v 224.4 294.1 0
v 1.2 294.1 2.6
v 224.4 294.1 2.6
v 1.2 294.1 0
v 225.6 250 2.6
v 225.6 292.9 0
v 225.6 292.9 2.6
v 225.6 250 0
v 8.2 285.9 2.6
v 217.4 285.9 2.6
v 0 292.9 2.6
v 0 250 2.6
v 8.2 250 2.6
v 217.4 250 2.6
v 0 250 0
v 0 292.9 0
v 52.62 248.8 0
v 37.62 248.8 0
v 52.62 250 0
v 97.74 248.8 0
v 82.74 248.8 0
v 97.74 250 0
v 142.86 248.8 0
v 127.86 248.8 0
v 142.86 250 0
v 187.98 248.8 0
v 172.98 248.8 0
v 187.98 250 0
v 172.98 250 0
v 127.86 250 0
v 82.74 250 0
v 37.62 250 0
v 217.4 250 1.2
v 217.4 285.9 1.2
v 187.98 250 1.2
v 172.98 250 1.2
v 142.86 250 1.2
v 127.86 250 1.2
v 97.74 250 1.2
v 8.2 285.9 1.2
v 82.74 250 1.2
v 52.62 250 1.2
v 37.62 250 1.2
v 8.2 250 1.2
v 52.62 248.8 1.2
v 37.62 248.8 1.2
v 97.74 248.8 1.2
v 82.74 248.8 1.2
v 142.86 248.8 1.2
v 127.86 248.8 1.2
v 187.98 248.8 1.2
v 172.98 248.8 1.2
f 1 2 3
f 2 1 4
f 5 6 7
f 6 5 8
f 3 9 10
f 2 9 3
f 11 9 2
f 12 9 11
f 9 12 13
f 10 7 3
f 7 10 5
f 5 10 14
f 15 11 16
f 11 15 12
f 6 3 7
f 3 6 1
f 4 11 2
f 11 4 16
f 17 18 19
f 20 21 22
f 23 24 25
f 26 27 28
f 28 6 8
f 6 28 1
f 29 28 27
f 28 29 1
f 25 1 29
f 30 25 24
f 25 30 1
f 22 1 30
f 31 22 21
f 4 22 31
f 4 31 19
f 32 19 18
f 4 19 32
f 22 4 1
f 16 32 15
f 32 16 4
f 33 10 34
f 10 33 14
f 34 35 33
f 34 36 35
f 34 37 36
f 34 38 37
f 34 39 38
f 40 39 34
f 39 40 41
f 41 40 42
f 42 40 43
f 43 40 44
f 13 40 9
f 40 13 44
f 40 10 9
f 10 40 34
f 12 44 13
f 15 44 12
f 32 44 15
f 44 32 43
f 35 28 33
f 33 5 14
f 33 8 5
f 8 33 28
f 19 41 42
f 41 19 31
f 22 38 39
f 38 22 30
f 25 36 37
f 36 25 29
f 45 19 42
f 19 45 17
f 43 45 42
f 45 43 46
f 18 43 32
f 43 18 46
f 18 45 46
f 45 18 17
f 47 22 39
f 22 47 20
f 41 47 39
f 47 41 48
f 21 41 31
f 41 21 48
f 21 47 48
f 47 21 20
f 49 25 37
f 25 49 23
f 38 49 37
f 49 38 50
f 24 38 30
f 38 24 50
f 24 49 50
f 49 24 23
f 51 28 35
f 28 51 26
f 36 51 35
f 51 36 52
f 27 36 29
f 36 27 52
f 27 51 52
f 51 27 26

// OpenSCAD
// file: common.scad
// ============================================================
// Photo Frame for 13.3" Spectra 6 E-Ink Display
// Shared parameters and utility modules
// ============================================================

/* [Display Parameters] */
// Active (visible) area
active_w = 202.8;
active_h = 270.4;
// Glass outline dimensions
glass_w = 208.8;
glass_h = 284.7;
display_d = 0.85;
// Non-active border (asymmetric)
border_left   = 3.0;
border_right  = 3.0;
border_top    = 3.0;
border_bottom = 11.3;   // 284.7 - 270.4 - 3 = 11.3, FPC side, large non-active area

/* [Driver Board Parameters] */
board_w = 80;
board_h = 40;
board_d = 1.6;
board_clearance = 10;     // component height clearance

/* [Battery Parameters] */
battery_w = 60;
battery_h = 35;
battery_d = 8;

/* [Frame Parameters] */
bezel_w    = 10;          // bezel width around active area
wall_thick = 2.4;         // front frame thickness
back_thick = 1.2;         // back panel thickness (6 layers @ 0.2mm)
frame_d    = 2.6;         // total frame depth (1.2mm back + 1.4mm cavity)
tol        = 0.2;
corner_r   = 3;

/* [Channel Parameters] */
outer_wall  = 2.0;        // outer wall thickness on bezel
inner_lip_d = 0.3;        // inner lip depth (presses on display)
channel_tol = 0.2;        // clearance for back panel in channel
lip_overlap = 2.0;        // how much bezel overlaps the glass on each side

/* [Printer Limits] */
bed_max = 260;

/* [Stand Parameters] */
stand_angle = 12;         // tilt angle in degrees
stand_foot_depth = 100;   // how far the base extends back

/* [FPC Cable] */
// 60-pin FPC exits from bottom of display, offset 2mm to the right
fpc_w = 134;              // FPC ribbon width
fpc_slot_w = fpc_w + 8;   // slot width with clearance (+4mm wider)
fpc_offset_x = 2;         // shifted 2mm to the right from center
fpc_slot_h = 6;

/* [Buttons - 1 reset + 3 custom] */
button_dia     = 3.5;
button_spacing = 12;
button_count   = 4;

/* [Joint Parameters] */
tongue_depth  = 1.2;      // tongue-and-groove interlock depth
tongue_length = 15;        // each tongue segment length
tongue_count  = 4;         // number of tongue segments along width
screw_r       = 1.5;       // M3 screw radius

// ============================================================
// Derived dimensions
// ============================================================

cavity_w = glass_w + 2 * tol;
cavity_h = glass_h + 2 * tol;

frame_w = cavity_w + 2 * bezel_w;
frame_h = cavity_h + 2 * bezel_w;

// Back panel rim widths (design parameters)
panel_rim  = 8.2;    // rim on left, right, top
bottom_rim = 0.8;    // thin bottom rim (hidden in base)

// Derived panel dimensions
panel_w = cavity_w + 2 * panel_rim;
panel_h = cavity_h + panel_rim + bottom_rim;
panel_inset = (frame_w - panel_w) / 2;  // how far panel is inset from bezel edge

// Inner lip width: derived to fill gap between panel rim and window
// Layout: outer_wall + channel_tol + panel_rim + channel_tol + inner_lip_w = win_x
inner_lip_w = bezel_w + tol + lip_overlap - outer_wall - panel_rim - 2 * channel_tol;

// Back panel split: bottom piece as tall as fits the bed
back_split_y = bed_max - 10;   // 250mm from bottom, top piece ~60mm

// Base dimensions (foot/stand only, attaches to bottom of back panel)
base_wall = wall_thick;
base_total_depth = stand_foot_depth;

// ============================================================
// Utility modules
// ============================================================

module rounded_rect(w, h, d, r) {
    linear_extrude(d)
        offset(r = r)
            offset(r = -r)
                square([w, h]);
}

module rounded_rect_2d(w, h, r) {
    offset(r = r)
        offset(r = -r)
            square([w, h]);
}

// Tongue segments along X axis at a given Y position
module tongue_strip(width, y_pos, z_pos, depth, length, count) {
    spacing = width / (count + 1);
    for (i = [1 : count]) {
        translate([i * spacing - length / 2, y_pos, z_pos])
            cube([length, depth, back_thick]);
    }
}

// ============================================================
// Front bezel - mitered picture frame style (4 sides)
// ============================================================

// Window position and size (derived from glass position + lip overlap)
win_x = bezel_w + tol + lip_overlap;
win_y = bezel_w + tol + lip_overlap;
win_w = glass_w - 2 * lip_overlap;
win_h = glass_h - 2 * lip_overlap;

// Bezel Z layout:
//   z=0                           bottom of outer wall (back of frame)
//   z=frame_d                     bezel body bottom (= back panel top)
//   z=frame_d+wall_thick          bezel front face

module front_bezel_full() {
    union() {
        // 1. Bezel body (visible frame, sits on top of back panel)
        difference() {
            translate([0, 0, frame_d])
                rounded_rect(frame_w, frame_h, wall_thick, corner_r);

            // Window opening - sharp corners (display glass is rectangular)
            translate([win_x, win_y, -0.1])
                cube([win_w, win_h, frame_d + wall_thick + 0.2]);
        }

        // 2. Outer wall (wraps around back panel edge)
        difference() {
            rounded_rect(frame_w, frame_h, frame_d + wall_thick, corner_r);

            // Hollow inside - sharp corners
            translate([outer_wall, outer_wall, -0.1])
                cube([
                    frame_w - 2 * outer_wall,
                    frame_h - 2 * outer_wall,
                    frame_d + wall_thick + 0.2
                ]);
        }

        // 3. Inner lip (presses on display glass)
        difference() {
            translate([win_x - inner_lip_w, win_y - inner_lip_w, frame_d - inner_lip_d])
                cube([win_w + 2 * inner_lip_w, win_h + 2 * inner_lip_w, inner_lip_d]);

            translate([win_x, win_y, frame_d - inner_lip_d - 0.1])
                cube([win_w, win_h, inner_lip_d + 0.2]);
        }
    }
}

// 45-degree miter cutting regions for each side
// Each region is a 2D polygon extruded tall enough to cut the bezel
e = 1; // margin for clean cuts

// Bottom: below both 45° lines from bottom corners
module miter_region_bottom() {
    linear_extrude(50, center = true)
        polygon([[-e, -e], [frame_w + e, -e], [frame_w / 2, frame_w / 2]]);
}

// Top: above both 45° lines from top corners
module miter_region_top() {
    linear_extrude(50, center = true)
        polygon([[-e, frame_h + e], [frame_w + e, frame_h + e],
                 [frame_w / 2, frame_h - frame_w / 2]]);
}

// Left: between 45° lines from both left corners
module miter_region_left() {
    linear_extrude(50, center = true)
        polygon([[-e, -e], [frame_h / 2, frame_h / 2], [-e, frame_h + e]]);
}

// Right: between 45° lines from both right corners
module miter_region_right() {
    linear_extrude(50, center = true)
        polygon([[frame_w + e, -e],
                 [frame_w - frame_h / 2, frame_h / 2],
                 [frame_w + e, frame_h + e]]);
}

// Full back panel (smaller than bezel, fits inside channel)
module back_panel_full() {
    // FPC slot X position: centered + offset to the right
    fpc_x = (panel_w - fpc_slot_w) / 2 + fpc_offset_x;

    difference() {
        rounded_rect(panel_w, panel_h, frame_d, max(corner_r - panel_inset, 0.5));

        // Display cavity
        translate([panel_rim, bottom_rim, back_thick])
            cube([cavity_w, cavity_h, frame_d]);

        // FPC cable exit slot at bottom (offset 2mm to right)
        translate([fpc_x, -0.1, back_thick])
            cube([fpc_slot_w, bottom_rim + 0.1, frame_d - back_thick + 0.1]);

        // FPC ribbon gap: 4mm zone from panel bottom edge
        // Goes through the full back wall so ribbon can fold freely
        fpc_gap = 4;
        translate([fpc_x, 0, -0.1])
            cube([fpc_slot_w, fpc_gap, frame_d + 0.1]);
    }
}
// main file
// ============================================================
// Back Panel - Top (small piece, ~60mm tall)
// ============================================================
include <common.scad>

module back_panel_top() {
    difference() {
        back_panel_full();
        // Cut away bottom portion
        translate([-1, -1, -1])
            cube([panel_w + 2, back_split_y + 1, frame_d + 2]);
    }
    // Tongue tabs extending below the cut edge
    tongue_strip(panel_w, back_split_y - tongue_depth, 0, tongue_depth, tongue_length, tongue_count);
}

back_panel_top();
